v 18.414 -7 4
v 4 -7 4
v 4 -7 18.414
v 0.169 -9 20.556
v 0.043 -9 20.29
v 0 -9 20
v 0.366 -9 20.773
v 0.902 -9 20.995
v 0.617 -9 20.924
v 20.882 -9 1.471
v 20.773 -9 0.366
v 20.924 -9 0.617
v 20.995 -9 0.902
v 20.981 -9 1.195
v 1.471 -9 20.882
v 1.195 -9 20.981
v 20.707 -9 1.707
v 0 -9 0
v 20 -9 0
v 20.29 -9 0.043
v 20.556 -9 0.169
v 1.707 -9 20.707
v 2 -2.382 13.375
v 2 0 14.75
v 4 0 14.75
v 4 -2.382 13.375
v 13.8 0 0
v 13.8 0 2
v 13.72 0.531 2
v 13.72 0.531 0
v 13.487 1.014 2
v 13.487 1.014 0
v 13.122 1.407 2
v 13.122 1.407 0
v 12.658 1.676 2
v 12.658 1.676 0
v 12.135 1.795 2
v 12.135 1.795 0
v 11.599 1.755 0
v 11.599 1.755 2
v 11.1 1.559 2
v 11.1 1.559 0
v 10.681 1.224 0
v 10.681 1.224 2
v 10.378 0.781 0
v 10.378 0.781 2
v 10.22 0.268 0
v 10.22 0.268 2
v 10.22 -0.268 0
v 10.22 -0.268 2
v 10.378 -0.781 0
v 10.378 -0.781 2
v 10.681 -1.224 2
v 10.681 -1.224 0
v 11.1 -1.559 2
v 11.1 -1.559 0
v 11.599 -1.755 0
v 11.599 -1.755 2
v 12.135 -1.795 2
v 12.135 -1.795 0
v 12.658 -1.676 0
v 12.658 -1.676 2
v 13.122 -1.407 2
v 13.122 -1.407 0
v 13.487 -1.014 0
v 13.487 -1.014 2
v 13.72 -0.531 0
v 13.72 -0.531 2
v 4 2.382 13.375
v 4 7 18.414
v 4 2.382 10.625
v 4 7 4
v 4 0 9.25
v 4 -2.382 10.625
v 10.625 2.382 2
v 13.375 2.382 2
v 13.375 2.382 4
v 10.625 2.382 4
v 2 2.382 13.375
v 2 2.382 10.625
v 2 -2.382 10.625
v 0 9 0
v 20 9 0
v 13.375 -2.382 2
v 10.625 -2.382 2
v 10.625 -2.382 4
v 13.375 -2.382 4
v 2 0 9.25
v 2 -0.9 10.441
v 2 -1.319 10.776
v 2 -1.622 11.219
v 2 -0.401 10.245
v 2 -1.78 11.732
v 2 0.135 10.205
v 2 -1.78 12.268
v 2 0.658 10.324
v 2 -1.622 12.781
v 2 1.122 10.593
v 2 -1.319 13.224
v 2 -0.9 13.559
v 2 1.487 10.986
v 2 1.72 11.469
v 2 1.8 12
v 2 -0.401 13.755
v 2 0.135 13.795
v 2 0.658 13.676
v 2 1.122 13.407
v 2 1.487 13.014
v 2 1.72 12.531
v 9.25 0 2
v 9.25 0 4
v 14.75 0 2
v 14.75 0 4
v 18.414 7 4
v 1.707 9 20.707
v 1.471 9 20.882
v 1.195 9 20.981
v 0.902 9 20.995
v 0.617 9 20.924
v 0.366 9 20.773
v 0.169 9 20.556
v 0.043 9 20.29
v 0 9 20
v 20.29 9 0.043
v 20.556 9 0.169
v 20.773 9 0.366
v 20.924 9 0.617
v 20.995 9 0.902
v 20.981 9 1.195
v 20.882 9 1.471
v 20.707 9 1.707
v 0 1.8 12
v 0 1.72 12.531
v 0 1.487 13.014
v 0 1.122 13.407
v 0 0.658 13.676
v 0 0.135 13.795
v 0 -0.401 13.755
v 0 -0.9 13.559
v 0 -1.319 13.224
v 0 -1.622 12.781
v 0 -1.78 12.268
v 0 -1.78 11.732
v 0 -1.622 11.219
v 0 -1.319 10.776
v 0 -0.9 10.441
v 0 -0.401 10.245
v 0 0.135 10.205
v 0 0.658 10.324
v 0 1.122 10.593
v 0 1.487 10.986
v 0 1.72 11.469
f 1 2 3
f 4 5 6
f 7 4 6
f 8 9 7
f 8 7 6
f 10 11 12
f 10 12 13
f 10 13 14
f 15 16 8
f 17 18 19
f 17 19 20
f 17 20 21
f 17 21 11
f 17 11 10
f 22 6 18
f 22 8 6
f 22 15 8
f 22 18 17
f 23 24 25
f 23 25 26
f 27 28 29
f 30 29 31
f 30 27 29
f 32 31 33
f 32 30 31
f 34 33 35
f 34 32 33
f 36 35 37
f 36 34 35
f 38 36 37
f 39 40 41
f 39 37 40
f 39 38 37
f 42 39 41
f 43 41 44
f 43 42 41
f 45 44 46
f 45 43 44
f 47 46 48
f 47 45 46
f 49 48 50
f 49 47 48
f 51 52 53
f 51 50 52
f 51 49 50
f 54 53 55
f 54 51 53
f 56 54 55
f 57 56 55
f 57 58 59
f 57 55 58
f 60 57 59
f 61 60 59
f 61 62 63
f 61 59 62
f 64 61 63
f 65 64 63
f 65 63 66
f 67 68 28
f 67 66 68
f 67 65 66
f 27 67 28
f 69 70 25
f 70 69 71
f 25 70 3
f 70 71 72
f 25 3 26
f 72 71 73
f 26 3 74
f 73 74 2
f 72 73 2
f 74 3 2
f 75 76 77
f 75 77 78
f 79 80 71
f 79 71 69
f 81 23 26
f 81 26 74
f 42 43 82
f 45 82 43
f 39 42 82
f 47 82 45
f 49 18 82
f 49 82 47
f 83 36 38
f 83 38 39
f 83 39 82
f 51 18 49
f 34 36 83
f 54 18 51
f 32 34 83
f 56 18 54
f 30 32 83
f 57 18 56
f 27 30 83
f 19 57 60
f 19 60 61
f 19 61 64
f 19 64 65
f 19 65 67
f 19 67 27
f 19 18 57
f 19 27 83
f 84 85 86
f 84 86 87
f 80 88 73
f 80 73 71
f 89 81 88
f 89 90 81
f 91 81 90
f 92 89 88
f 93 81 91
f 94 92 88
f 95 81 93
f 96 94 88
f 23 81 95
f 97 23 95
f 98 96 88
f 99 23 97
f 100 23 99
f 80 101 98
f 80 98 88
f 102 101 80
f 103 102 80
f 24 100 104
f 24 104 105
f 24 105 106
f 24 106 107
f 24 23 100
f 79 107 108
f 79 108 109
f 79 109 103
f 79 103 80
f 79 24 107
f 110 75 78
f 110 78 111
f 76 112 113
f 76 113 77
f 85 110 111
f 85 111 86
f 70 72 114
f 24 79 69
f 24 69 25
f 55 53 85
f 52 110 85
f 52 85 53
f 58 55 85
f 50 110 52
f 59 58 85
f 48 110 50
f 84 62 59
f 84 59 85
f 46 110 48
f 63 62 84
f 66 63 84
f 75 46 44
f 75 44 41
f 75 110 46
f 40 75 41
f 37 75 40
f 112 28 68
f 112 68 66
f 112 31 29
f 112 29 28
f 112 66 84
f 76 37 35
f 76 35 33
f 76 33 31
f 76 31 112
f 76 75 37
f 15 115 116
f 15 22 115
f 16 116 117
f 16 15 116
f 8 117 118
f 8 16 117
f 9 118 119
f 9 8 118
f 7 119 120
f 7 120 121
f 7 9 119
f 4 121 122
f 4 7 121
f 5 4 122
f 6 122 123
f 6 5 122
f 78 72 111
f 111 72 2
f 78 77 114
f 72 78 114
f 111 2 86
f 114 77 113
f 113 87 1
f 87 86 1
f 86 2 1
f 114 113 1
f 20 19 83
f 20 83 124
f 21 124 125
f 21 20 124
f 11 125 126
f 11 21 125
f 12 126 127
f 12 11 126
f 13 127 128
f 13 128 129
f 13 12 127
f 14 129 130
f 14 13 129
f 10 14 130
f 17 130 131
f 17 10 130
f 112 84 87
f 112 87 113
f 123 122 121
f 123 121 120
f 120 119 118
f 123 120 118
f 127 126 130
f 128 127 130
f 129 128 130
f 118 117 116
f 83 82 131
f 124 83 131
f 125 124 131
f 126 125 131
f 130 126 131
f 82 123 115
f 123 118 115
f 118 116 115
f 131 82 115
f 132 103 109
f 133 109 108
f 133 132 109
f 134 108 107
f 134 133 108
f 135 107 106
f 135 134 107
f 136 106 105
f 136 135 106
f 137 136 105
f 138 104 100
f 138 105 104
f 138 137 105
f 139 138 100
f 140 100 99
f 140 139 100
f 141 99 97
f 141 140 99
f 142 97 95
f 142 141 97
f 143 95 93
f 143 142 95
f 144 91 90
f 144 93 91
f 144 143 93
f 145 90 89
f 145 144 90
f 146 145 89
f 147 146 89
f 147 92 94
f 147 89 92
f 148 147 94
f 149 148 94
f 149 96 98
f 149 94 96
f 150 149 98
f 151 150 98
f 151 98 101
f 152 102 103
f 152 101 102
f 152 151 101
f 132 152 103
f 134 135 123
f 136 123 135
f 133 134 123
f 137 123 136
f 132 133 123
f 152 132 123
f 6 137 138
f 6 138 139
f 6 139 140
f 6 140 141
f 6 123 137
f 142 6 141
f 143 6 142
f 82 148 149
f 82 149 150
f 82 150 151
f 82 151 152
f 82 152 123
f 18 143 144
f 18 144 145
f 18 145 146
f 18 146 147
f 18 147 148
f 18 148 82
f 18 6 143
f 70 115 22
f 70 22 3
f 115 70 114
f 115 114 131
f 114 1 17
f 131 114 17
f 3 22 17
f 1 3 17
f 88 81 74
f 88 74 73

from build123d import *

# Parameters (mm, degrees)
PAD001_DEPTH         = 9
POCKET001_DEPTH      = 7
SKETCH004_R          = 1.8
POCKET002_DEPTH      = 0.001
POCKET002_DEPTH_BACK = 21.001
SKETCH005_R          = 1.8
POCKET003_DEPTH      = 0.001
POCKET003_DEPTH_BACK = 21.001
POCKET004_DEPTH      = 5
POCKET005_DEPTH      = 5


with BuildPart() as part:
    # Sketch002 → Pad001 (new body, symmetric)
    with BuildSketch(Plane.XZ):
        with BuildLine():
            Line((0, 20), (0, 0))
            Line((0, 0), (20, 0))
            ThreePointArc((20, 0), (20.92388, 0.617317), (20.707107, 1.707107))
            Line((1.707107, 20.707107), (20.707107, 1.707107))
            ThreePointArc((1.707107, 20.707107), (0.617317, 20.92388), (0, 20))
        make_face()
    extrude(amount=PAD001_DEPTH, both=True)

    # Sketch003 → Pocket001 (cut, symmetric)
    with BuildSketch(Plane.XZ):
        Polygon((4, 24), (4, 4), (24, 4), align=None)
    extrude(amount=POCKET001_DEPTH, both=True, mode=Mode.SUBTRACT)

    # Sketch004 → Pocket002 (cut, two sides)
    with BuildSketch(Plane.XY) as pocket002_sk:
        with Locations((12, 0)):
            Circle(SKETCH004_R)
    extrude(amount=-POCKET002_DEPTH, mode=Mode.SUBTRACT)
    extrude(pocket002_sk.sketch, amount=POCKET002_DEPTH_BACK, mode=Mode.SUBTRACT)

    # Sketch005 → Pocket003 (cut, two sides)
    with BuildSketch(Plane.YZ) as pocket003_sk:
        with Locations((0, 12)):
            Circle(SKETCH005_R)
    extrude(amount=-POCKET003_DEPTH, mode=Mode.SUBTRACT)
    extrude(pocket003_sk.sketch, amount=POCKET003_DEPTH_BACK, mode=Mode.SUBTRACT)

    # Sketch006 → Pocket004 (cut)
    with BuildSketch(Plane.YZ.offset(2)):
        Polygon((0, 14.75), (-2.38157, 13.375), (-2.38157, 10.625), (0, 9.25), (2.38157, 10.625), (2.38157, 13.375), align=None)
    extrude(amount=POCKET004_DEPTH, mode=Mode.SUBTRACT)

    # Sketch007 → Pocket005 (cut)
    with BuildSketch(Plane.XY.offset(2)):
        Polygon((14.75, 0), (13.375, 2.38157), (10.625, 2.38157), (9.25, 0), (10.625, -2.38157), (13.375, -2.38157), align=None)
    extrude(amount=POCKET005_DEPTH, mode=Mode.SUBTRACT)


solid = part.part
